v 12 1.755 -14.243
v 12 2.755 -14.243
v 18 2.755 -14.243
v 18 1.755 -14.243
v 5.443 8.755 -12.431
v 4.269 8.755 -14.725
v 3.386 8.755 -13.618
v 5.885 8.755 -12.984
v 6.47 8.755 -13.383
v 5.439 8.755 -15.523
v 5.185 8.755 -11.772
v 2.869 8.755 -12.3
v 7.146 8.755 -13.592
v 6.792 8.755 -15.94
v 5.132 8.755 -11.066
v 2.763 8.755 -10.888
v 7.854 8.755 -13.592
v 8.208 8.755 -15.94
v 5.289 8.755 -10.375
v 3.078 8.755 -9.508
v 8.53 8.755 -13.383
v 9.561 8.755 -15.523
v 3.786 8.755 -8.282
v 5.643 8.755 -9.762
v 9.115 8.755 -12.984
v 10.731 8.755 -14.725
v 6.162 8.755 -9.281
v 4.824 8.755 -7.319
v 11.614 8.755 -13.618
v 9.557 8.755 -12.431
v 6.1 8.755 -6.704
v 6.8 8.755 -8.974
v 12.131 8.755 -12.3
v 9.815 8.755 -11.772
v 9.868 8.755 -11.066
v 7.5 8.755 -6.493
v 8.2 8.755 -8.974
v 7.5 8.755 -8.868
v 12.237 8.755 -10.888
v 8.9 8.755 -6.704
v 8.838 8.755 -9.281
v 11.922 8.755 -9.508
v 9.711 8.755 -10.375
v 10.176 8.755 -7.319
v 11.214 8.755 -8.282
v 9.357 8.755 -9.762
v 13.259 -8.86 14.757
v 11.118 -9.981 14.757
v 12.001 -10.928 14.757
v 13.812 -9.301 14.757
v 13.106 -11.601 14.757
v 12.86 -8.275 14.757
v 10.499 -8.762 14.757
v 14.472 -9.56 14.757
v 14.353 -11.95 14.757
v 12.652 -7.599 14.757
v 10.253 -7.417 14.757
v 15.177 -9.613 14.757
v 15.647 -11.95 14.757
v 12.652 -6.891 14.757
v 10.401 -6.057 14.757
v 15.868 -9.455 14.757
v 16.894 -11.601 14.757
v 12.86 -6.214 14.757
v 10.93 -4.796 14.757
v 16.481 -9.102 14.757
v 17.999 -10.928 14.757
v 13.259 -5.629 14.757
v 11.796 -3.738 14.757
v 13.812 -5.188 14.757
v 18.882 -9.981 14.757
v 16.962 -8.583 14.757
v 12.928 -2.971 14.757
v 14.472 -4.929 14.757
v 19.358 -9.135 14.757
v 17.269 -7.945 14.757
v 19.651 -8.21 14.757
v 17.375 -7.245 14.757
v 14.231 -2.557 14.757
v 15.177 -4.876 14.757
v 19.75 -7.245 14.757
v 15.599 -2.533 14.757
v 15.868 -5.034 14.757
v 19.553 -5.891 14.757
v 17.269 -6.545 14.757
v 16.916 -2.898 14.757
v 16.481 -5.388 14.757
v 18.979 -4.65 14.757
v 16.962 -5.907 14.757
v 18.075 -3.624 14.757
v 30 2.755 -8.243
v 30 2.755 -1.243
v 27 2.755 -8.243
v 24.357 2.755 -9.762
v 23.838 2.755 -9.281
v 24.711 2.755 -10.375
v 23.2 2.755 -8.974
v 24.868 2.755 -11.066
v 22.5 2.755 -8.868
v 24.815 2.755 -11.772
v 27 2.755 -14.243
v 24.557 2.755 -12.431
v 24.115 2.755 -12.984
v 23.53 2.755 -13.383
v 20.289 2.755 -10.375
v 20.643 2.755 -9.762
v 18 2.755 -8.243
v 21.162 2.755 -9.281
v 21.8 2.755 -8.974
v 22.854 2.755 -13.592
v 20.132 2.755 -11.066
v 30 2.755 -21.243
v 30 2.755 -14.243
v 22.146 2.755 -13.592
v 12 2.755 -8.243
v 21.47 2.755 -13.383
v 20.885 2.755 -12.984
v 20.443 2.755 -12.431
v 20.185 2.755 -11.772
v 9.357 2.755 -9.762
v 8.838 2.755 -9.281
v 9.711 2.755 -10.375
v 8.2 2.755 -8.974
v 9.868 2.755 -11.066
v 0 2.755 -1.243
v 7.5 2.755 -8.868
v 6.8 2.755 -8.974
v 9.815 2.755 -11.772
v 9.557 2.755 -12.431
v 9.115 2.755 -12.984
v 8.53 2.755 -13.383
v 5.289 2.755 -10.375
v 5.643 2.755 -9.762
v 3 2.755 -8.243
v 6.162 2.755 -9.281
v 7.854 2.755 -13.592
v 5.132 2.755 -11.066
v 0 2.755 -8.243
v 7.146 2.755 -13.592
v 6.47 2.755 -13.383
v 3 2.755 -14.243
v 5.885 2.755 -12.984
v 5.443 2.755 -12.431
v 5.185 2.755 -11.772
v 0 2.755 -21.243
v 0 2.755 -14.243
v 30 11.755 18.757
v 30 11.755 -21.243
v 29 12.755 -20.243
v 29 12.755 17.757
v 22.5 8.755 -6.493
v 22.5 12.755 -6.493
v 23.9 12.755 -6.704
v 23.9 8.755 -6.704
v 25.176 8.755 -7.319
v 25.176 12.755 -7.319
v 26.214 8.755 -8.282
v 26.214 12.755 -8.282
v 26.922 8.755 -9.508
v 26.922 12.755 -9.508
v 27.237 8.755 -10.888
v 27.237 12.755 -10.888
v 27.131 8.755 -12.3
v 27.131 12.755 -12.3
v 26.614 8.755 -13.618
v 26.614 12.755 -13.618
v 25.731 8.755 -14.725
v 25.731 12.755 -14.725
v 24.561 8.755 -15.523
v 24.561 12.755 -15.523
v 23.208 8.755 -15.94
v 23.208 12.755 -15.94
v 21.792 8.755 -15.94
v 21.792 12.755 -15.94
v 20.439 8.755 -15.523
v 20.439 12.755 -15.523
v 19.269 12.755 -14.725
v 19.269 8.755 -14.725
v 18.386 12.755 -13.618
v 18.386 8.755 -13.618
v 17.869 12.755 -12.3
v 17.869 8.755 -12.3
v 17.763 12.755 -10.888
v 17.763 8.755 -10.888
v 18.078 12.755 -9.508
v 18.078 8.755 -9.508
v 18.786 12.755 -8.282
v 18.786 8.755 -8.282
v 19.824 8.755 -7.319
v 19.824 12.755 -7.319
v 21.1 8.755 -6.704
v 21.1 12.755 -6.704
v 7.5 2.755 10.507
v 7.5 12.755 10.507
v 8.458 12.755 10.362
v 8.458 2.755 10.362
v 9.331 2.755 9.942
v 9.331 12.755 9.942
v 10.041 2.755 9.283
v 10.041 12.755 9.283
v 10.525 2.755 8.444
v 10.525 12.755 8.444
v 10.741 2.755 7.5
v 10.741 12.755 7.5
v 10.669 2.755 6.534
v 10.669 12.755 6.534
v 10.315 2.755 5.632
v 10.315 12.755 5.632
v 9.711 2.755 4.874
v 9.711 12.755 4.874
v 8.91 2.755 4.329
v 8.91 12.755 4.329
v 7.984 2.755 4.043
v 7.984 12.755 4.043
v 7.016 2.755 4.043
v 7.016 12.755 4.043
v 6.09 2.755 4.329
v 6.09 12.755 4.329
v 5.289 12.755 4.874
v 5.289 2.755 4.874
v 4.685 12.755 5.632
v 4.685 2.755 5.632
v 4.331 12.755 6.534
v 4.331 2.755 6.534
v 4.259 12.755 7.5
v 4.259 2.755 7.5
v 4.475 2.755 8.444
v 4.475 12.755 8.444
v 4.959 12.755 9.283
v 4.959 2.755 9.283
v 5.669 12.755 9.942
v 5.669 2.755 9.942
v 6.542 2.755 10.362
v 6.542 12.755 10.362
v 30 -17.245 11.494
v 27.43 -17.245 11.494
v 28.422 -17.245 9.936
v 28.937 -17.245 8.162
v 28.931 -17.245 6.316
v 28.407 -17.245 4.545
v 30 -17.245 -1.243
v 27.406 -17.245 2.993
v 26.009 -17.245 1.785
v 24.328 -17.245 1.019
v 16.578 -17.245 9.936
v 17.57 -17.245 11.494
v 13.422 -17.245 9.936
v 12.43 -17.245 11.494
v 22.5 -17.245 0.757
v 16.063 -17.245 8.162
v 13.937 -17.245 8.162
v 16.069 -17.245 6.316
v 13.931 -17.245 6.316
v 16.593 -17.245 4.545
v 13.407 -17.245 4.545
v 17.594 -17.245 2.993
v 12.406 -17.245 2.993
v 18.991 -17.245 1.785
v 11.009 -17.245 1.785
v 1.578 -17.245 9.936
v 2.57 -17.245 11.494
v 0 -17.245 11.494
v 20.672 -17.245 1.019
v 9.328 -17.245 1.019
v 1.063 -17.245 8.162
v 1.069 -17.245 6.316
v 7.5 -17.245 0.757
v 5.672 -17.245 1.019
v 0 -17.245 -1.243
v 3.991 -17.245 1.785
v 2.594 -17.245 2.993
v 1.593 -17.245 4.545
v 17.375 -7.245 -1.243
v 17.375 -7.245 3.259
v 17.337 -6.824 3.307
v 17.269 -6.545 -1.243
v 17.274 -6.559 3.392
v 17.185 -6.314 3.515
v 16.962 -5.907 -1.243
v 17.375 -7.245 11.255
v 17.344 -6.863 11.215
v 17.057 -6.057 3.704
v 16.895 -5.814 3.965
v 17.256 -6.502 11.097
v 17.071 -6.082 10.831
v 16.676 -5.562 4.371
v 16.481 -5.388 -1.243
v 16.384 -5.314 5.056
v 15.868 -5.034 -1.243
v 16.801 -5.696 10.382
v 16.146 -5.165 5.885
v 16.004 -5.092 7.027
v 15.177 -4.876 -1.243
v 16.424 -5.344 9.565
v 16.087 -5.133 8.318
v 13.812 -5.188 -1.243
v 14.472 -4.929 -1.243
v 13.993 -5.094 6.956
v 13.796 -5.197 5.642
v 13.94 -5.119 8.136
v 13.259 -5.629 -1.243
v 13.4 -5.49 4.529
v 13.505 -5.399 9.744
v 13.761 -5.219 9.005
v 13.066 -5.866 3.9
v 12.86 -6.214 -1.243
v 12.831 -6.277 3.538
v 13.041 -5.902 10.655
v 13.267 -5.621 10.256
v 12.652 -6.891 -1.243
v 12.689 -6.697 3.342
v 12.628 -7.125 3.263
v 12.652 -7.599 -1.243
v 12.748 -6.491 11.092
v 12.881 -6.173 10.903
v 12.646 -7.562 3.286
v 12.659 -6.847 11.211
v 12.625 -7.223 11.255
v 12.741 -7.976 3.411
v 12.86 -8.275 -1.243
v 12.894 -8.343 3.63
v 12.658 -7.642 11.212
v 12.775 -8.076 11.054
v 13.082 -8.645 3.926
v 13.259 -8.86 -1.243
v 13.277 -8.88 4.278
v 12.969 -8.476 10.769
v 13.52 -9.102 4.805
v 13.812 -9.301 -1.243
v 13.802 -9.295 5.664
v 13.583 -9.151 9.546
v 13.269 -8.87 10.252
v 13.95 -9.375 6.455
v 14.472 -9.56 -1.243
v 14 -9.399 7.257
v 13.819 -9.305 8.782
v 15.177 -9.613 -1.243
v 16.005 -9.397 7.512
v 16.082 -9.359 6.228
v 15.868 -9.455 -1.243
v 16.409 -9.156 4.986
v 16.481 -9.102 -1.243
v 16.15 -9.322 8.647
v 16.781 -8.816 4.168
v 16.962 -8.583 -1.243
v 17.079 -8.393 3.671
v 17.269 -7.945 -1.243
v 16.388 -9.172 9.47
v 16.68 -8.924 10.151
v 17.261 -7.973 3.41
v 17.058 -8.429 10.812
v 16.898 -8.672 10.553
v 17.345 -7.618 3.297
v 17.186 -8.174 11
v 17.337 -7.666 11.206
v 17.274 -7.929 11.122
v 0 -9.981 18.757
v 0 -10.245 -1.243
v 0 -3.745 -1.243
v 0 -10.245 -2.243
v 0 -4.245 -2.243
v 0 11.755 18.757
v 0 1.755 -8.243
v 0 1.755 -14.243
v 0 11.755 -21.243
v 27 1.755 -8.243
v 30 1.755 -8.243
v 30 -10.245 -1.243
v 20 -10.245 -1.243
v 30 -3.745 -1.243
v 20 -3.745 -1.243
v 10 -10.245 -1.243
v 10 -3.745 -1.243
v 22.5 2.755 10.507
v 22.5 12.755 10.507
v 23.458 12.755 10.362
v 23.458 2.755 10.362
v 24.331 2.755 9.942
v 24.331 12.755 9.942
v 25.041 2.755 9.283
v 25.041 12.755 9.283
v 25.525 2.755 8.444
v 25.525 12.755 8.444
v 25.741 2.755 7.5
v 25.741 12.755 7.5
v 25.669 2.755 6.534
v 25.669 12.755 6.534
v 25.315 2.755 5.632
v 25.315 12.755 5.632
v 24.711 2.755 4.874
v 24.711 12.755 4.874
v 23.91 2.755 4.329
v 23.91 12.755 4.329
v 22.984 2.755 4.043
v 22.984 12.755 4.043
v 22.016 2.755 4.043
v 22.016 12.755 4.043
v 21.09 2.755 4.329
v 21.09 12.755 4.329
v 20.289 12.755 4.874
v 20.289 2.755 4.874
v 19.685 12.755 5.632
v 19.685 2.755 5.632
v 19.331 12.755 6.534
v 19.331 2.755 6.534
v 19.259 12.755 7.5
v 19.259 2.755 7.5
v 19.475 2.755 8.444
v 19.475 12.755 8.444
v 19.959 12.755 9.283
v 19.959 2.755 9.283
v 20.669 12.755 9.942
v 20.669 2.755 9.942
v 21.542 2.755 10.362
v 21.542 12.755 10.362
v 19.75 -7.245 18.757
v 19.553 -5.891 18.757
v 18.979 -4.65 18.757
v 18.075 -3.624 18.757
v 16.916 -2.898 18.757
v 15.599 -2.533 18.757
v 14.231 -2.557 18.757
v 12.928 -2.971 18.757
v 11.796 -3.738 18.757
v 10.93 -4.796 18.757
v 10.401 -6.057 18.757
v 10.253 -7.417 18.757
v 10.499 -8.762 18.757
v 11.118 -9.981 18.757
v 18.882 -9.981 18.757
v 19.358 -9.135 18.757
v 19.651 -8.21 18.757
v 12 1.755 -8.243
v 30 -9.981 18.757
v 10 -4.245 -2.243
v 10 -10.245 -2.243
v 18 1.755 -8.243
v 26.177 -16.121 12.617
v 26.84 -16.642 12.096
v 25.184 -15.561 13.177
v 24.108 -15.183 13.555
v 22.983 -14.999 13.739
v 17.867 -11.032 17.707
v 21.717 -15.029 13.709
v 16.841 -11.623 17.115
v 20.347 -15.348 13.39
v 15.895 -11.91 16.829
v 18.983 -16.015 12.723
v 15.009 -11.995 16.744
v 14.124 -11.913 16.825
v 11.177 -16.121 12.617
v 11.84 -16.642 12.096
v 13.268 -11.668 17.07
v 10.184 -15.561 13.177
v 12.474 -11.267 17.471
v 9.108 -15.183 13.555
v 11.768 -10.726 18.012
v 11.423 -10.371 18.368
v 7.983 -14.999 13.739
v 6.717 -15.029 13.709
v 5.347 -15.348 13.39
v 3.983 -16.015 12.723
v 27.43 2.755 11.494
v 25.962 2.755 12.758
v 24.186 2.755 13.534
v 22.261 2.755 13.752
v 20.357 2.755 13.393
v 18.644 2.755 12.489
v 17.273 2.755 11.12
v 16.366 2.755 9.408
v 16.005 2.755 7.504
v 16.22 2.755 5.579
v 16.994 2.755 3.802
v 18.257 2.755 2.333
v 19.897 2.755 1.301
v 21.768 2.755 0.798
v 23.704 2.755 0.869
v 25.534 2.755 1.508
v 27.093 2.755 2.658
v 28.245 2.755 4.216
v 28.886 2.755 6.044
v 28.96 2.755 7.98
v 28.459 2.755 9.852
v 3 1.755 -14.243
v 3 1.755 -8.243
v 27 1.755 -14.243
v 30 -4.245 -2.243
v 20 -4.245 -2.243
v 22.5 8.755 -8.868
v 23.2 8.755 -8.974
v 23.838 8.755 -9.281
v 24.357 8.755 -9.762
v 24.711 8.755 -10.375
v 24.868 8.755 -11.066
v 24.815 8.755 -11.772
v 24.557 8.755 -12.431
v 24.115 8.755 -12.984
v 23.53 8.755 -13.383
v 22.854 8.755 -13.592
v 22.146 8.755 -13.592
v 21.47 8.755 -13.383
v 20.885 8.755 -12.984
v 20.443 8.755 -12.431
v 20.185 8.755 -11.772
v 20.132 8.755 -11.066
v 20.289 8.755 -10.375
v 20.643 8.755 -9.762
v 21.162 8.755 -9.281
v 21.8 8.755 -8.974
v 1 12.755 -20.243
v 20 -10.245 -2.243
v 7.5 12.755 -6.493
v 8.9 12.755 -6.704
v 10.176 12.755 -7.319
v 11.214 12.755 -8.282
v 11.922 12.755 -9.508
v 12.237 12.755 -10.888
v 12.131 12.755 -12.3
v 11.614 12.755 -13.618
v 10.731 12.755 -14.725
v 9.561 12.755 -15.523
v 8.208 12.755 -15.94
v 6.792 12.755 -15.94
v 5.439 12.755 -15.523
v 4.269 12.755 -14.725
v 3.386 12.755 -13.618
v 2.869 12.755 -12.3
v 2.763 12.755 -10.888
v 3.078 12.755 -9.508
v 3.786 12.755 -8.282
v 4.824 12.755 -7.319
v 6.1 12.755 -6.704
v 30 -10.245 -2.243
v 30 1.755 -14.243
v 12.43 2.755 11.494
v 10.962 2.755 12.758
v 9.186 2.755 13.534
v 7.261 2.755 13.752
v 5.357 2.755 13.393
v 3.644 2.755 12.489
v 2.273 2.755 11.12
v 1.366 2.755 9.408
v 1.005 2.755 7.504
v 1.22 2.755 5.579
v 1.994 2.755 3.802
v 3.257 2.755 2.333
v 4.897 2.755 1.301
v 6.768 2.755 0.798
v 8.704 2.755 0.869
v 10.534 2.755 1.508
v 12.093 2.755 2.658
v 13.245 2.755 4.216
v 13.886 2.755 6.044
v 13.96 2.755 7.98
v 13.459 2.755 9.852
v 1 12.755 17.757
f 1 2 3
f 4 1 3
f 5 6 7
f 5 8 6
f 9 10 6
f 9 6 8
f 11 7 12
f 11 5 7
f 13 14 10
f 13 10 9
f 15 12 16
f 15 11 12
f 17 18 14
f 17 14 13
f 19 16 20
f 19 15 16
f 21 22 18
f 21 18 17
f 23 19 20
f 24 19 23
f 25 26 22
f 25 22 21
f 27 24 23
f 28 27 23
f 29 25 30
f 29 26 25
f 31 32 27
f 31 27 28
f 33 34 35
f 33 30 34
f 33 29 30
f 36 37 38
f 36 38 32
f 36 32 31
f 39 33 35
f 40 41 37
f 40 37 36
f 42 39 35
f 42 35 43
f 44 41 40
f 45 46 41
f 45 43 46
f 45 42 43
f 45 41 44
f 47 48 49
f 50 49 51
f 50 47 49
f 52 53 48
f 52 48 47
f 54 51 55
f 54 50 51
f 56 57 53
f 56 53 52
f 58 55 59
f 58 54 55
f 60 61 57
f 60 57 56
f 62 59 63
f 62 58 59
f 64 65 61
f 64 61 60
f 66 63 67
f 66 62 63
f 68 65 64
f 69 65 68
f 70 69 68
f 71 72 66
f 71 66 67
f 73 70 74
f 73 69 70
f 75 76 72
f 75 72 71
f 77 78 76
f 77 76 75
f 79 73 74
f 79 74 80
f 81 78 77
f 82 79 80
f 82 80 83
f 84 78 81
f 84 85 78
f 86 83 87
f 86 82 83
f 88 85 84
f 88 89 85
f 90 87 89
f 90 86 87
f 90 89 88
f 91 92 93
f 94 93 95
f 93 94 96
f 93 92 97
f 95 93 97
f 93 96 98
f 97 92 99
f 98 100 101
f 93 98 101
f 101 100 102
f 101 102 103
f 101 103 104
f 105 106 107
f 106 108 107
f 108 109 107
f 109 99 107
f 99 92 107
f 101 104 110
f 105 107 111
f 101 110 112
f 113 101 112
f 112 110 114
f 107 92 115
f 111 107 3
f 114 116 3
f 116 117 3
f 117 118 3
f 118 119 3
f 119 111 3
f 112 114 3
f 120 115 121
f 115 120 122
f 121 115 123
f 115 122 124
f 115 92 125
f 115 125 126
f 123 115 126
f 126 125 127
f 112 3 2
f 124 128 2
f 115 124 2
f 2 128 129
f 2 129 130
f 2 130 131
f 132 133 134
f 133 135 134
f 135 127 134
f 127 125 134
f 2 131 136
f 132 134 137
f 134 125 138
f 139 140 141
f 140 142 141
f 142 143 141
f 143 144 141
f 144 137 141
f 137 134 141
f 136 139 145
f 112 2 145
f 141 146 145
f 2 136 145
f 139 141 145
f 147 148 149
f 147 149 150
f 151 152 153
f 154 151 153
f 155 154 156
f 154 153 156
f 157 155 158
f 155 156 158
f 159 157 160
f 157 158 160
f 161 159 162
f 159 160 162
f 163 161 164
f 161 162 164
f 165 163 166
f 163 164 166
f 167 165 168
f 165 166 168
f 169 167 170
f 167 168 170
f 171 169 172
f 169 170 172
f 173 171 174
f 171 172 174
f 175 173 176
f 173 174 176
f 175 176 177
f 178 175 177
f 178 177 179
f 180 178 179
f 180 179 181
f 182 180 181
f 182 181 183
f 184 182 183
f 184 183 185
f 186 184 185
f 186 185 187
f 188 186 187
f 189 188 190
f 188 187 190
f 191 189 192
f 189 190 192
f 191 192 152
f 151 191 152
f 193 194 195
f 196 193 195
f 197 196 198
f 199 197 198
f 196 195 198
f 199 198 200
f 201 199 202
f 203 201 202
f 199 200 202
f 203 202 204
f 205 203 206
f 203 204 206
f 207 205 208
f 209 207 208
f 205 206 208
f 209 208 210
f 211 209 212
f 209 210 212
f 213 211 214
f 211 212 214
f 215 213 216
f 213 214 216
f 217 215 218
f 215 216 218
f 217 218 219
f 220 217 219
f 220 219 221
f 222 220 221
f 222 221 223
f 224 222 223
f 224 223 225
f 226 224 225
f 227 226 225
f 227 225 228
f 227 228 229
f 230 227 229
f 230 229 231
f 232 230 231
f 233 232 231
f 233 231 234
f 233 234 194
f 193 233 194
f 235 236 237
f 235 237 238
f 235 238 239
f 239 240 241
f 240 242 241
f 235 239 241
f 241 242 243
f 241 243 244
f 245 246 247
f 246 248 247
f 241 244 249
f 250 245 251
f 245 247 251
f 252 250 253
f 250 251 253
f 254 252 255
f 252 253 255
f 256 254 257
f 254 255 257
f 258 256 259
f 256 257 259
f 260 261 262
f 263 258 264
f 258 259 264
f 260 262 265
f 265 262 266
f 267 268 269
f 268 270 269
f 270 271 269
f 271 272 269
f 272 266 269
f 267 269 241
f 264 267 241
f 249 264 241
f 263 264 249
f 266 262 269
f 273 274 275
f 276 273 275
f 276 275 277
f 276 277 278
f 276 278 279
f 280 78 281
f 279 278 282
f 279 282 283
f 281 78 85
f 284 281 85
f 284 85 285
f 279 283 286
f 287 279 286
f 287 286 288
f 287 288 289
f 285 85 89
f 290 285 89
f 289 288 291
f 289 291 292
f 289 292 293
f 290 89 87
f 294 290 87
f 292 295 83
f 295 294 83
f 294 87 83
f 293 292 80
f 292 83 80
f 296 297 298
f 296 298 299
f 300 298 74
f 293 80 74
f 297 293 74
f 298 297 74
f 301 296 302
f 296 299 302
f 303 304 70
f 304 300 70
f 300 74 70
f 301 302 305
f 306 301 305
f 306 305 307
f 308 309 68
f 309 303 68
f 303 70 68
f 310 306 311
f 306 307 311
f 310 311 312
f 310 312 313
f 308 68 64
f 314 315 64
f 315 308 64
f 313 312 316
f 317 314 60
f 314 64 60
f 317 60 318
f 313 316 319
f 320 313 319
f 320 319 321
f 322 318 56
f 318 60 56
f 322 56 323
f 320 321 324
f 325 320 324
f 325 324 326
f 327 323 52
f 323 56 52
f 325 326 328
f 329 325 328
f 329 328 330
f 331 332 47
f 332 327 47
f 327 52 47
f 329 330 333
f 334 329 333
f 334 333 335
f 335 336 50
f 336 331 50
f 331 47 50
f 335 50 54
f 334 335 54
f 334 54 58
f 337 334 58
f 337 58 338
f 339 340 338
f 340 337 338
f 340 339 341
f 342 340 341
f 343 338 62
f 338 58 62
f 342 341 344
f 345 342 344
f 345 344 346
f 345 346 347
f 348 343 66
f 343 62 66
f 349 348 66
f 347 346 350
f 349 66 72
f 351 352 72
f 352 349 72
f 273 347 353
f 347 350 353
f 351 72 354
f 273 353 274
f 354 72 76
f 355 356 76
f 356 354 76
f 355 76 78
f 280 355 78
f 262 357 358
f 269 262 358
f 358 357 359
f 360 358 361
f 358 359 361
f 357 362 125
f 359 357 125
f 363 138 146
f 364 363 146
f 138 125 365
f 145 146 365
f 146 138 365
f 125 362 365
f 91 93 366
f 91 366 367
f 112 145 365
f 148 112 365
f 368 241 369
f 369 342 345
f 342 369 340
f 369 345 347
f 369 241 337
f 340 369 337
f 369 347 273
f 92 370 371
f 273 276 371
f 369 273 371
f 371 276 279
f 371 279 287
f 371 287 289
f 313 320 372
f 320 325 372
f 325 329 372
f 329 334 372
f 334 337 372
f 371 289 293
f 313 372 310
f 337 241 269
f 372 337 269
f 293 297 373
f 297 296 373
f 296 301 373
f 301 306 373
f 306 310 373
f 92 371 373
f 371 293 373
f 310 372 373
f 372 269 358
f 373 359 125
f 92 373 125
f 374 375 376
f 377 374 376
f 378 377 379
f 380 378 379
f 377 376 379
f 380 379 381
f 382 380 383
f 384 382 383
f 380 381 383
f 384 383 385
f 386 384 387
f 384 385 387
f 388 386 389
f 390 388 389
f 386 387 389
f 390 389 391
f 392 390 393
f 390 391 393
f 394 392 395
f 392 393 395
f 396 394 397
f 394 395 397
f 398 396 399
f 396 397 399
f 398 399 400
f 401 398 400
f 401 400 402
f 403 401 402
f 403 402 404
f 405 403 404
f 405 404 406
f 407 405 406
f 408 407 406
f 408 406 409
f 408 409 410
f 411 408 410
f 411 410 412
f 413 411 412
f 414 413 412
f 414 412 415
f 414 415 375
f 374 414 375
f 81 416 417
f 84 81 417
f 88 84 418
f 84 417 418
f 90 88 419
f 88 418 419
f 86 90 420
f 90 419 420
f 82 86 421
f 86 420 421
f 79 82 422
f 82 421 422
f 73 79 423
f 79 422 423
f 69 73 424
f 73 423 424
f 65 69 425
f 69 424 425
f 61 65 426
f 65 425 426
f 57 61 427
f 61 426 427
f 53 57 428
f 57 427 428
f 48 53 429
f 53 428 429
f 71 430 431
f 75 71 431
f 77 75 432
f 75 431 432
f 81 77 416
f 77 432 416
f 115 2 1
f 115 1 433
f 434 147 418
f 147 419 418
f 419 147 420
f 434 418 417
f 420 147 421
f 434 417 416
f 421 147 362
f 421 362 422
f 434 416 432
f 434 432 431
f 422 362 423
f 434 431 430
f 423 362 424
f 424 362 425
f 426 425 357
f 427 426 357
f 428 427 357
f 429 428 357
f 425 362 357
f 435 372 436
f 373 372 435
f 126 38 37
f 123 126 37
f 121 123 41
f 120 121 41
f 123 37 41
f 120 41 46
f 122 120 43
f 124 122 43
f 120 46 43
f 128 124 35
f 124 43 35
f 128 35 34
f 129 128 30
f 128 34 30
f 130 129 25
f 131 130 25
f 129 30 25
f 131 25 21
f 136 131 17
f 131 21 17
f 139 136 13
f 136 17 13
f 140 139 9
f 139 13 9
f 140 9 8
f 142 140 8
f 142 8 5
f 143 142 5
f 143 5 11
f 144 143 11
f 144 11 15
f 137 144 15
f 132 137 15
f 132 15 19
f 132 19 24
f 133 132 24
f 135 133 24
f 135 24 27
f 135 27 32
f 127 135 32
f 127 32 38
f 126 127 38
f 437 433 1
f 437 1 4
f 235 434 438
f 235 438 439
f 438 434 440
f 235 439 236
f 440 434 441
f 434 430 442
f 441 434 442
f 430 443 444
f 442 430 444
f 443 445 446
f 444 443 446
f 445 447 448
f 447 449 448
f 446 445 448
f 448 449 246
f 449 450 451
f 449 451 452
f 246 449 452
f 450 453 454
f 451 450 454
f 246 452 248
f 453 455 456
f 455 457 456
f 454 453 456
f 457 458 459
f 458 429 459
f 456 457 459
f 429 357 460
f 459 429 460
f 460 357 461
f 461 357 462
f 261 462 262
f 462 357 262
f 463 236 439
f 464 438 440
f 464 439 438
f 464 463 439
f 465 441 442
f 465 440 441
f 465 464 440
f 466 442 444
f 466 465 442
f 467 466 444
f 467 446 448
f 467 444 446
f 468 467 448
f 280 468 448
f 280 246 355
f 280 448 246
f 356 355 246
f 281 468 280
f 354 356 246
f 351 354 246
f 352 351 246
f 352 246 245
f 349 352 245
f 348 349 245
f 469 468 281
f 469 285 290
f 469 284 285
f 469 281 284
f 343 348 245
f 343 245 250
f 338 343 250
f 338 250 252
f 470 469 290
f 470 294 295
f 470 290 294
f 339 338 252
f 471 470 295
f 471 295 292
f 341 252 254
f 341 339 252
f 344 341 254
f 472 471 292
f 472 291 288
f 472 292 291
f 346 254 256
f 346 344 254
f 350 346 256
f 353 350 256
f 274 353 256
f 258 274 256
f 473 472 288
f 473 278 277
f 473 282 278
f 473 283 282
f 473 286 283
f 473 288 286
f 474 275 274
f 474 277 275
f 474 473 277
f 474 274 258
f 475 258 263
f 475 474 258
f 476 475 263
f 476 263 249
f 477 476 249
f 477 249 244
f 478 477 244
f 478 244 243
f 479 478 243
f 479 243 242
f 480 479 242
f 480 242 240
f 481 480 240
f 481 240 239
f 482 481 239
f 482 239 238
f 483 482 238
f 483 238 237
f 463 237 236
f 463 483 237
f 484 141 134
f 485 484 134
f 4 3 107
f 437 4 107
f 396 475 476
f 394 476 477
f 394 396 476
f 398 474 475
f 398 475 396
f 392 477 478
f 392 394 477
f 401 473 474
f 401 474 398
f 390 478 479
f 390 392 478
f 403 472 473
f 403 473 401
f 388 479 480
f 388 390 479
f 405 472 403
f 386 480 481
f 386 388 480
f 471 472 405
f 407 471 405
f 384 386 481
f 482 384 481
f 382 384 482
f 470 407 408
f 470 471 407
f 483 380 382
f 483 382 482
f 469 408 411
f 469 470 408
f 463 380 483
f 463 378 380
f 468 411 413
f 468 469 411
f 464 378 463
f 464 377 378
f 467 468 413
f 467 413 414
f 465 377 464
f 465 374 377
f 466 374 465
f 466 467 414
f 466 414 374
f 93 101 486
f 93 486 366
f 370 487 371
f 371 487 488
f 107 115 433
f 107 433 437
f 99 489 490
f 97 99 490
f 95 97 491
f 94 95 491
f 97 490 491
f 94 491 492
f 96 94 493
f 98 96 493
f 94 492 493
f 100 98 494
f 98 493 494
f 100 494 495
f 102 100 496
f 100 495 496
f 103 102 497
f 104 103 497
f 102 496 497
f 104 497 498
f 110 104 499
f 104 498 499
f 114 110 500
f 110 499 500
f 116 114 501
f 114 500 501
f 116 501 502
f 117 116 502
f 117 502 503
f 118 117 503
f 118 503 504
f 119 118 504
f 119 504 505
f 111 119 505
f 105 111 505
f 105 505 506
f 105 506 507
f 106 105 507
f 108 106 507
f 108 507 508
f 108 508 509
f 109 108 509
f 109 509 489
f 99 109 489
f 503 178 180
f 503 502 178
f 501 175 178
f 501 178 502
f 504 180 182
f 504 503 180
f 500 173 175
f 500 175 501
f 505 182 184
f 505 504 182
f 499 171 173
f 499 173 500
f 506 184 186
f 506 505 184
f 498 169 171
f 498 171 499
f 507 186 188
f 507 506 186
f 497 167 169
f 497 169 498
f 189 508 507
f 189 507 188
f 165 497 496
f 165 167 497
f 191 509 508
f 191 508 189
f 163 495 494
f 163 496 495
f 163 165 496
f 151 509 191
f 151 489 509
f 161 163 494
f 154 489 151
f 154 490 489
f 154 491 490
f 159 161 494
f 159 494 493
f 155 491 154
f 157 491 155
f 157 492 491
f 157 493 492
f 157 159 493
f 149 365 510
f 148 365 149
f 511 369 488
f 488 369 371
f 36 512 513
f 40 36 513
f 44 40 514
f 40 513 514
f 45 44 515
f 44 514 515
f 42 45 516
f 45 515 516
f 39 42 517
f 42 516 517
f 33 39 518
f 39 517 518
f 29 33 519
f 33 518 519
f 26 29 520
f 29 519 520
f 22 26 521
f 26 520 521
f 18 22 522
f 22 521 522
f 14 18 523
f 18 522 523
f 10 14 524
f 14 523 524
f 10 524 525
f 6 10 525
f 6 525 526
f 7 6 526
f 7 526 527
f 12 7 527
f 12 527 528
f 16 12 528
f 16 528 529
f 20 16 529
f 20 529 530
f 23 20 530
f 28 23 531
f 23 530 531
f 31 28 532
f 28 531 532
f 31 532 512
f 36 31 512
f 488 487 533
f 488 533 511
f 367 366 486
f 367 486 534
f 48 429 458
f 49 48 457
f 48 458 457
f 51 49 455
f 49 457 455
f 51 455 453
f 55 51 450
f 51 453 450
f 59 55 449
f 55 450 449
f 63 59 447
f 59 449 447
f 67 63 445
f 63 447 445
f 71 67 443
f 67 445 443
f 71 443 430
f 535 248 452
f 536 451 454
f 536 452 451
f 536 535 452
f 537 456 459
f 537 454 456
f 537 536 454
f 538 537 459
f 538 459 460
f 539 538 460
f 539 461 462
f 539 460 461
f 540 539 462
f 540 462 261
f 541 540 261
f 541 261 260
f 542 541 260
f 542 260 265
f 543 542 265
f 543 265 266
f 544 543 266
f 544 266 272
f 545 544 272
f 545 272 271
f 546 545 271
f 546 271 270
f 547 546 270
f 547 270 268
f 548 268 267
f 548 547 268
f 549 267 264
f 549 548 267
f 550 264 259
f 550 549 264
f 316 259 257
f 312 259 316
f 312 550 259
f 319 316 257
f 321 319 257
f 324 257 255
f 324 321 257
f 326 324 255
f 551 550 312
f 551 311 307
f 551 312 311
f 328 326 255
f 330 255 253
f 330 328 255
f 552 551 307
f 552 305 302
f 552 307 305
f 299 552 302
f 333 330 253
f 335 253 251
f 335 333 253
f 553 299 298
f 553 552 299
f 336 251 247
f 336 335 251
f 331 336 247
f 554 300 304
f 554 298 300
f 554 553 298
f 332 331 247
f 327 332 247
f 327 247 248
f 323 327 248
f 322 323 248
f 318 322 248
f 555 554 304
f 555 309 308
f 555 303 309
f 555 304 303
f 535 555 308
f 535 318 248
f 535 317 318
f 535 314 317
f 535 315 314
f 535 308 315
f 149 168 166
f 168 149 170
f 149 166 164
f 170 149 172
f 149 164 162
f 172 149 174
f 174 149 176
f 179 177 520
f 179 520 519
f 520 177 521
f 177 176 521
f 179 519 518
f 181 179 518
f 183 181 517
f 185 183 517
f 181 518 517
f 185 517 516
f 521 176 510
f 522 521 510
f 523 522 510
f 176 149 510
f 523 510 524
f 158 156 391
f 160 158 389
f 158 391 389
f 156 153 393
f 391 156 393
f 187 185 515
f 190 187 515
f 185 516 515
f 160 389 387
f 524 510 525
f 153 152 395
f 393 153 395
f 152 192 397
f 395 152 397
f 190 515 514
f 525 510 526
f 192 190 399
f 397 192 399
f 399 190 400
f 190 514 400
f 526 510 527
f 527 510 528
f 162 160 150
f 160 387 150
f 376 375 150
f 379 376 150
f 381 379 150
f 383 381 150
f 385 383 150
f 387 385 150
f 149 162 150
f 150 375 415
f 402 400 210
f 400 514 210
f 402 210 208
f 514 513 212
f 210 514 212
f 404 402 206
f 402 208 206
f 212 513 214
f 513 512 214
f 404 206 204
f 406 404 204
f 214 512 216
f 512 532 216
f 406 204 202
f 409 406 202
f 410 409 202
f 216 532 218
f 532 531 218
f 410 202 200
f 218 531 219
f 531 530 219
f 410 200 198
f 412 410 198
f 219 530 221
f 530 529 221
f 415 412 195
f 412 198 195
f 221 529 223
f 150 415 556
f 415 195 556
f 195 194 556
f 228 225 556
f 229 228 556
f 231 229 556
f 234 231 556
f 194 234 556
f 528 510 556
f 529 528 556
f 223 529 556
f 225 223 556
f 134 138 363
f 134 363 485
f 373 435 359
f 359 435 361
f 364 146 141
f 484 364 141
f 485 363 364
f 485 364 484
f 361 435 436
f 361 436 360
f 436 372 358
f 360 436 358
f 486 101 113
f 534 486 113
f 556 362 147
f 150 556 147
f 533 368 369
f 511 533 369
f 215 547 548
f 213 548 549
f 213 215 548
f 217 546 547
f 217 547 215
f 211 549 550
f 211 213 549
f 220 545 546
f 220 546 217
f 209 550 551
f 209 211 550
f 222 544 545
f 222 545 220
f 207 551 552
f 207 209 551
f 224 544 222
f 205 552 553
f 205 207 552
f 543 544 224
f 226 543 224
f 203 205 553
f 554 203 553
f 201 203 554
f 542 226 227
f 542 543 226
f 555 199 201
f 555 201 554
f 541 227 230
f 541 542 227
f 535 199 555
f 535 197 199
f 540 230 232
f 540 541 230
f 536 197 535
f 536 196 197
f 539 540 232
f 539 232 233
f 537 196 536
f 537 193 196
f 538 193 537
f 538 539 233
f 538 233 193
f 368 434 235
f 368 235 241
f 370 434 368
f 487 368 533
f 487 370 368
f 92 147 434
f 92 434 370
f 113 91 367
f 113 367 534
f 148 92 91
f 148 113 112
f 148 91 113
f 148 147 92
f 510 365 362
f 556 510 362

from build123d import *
from OCP.BRepFilletAPI import BRepFilletAPI_MakeChamfer

# Parameters (mm, degrees)
RESSALTO_EXTRUS_O1_DEPTH = 30
CORTE_EXTRUS_O1_REACH    = 49.448
ESBO_O2_R                = 2.375
ESBO_O2_R_2              = 3.25
ESBO_O2_3_R              = 4.75
ESBO_O2_3_R_2            = 2.375
CORTE_EXTRUS_O3_DEPTH    = 4
CORTE_EXTRUS_O2_REACH    = 54.89
ESBO_O3_R                = 2.375
ESBO_O3_3_R              = 2.375
CORTE_EXTRUS_O4_DEPTH    = 4
ESBO_O4_W                = 6
ESBO_O4_H                = 6
ESBO_O4_W_2              = 3
RESSALTO_EXTRUS_O2_DEPTH = 1
ESBO_O5_R                = 6.5
CORTE_EXTRUS_O5_DEPTH    = 42.848200707
CHANFRO1_SIZE            = 1
ESBO_O6_W                = 10
ESBO_O6_H                = 6
RESSALTO_EXTRUS_O3_DEPTH = 1
CHANFRO2_SIZE            = 0.5
CHANFRO2_SIZE_2          = 1


with BuildPart() as part:
    # Esboço1 → Ressalto-extrusão1 (new body)
    with BuildSketch(Plane(origin=(0, 0, 0), x_dir=(0, 0, -1), z_dir=(1, 0, 0))):
        Polygon((21.243161309, 12.755336939), (-18.756838691, 12.755336939), (-18.756838691, -9.981327227), (-11.493502857, -17.244663061), (1.243161309, -17.244663061), (1.243161309, 2.755336939), (21.243161309, 2.755336939), align=None)
    extrude(amount=RESSALTO_EXTRUS_O1_DEPTH)

    # Esboço2 → Corte-extrusão1 (cut, up to next)
    with BuildSketch(Plane(origin=(0, 12.755336939, 0), x_dir=(1, 0, 0), z_dir=(0, 1, 0)), mode=Mode.PRIVATE) as corte_extrus_o1_sk1:
        with Locations(Location((7.5, 11.243161309, 0), (0, 0, 270))):
            Circle(ESBO_O2_R)
    corte_extrus_o1_tool1 = extrude(corte_extrus_o1_sk1.sketch, amount=-CORTE_EXTRUS_O1_REACH, mode=Mode.PRIVATE) & part.part
    # Esboço2 → Corte-extrusão1 (cut, up to next)
    with BuildSketch(Plane(origin=(0, 12.755336939, 0), x_dir=(1, 0, 0), z_dir=(0, 1, 0)), mode=Mode.PRIVATE) as corte_extrus_o1_sk2:
        with Locations(Location((22.5, 11.243161309, 0), (0, 0, 270))):
            Circle(ESBO_O2_R)
    corte_extrus_o1_tool2 = extrude(corte_extrus_o1_sk2.sketch, amount=-CORTE_EXTRUS_O1_REACH, mode=Mode.PRIVATE) & part.part
    # Esboço2 → Corte-extrusão1 (cut, up to next)
    with BuildSketch(Plane(origin=(0, 12.755336939, 0), x_dir=(1, 0, 0), z_dir=(0, 1, 0)), mode=Mode.PRIVATE) as corte_extrus_o1_sk3:
        with Locations(Location((22.5, -7.256838691, 0), (0, 0, 270))):
            Circle(ESBO_O2_R_2)
    corte_extrus_o1_tool3 = extrude(corte_extrus_o1_sk3.sketch, amount=-CORTE_EXTRUS_O1_REACH, mode=Mode.PRIVATE) & part.part
    # Esboço2 → Corte-extrusão1 (cut, up to next)
    with BuildSketch(Plane(origin=(0, 12.755336939, 0), x_dir=(1, 0, 0), z_dir=(0, 1, 0)), mode=Mode.PRIVATE) as corte_extrus_o1_sk4:
        with Locations(Location((7.5, -7.256838691, 0), (0, 0, 270))):
            Circle(ESBO_O2_R_2)
    corte_extrus_o1_tool4 = extrude(corte_extrus_o1_sk4.sketch, amount=-CORTE_EXTRUS_O1_REACH, mode=Mode.PRIVATE) & part.part
    add(corte_extrus_o1_tool1.solids().sort_by_distance((7.5, 12.755337, -11.243161))[0], mode=Mode.SUBTRACT)
    add(corte_extrus_o1_tool2.solids().sort_by_distance((22.5, 12.755337, -11.243161))[0], mode=Mode.SUBTRACT)
    add(corte_extrus_o1_tool3.solids().sort_by_distance((22.5, 12.755337, 7.256839))[0], mode=Mode.SUBTRACT)
    add(corte_extrus_o1_tool4.solids().sort_by_distance((7.5, 12.755337, 7.256839))[0], mode=Mode.SUBTRACT)

    # Esboço2<3> → Corte-extrusão3 (cut)
    # profile 1 of 2: a face of its own
    with BuildSketch(Plane(origin=(0, 12.755336939, 0), x_dir=(1, 0, 0), z_dir=(0, 1, 0))):
        with Locations(Location((7.5, 11.243161309, 0), (0, 0, 270))):
            Circle(ESBO_O2_3_R)
        with Locations(Location((7.5, 11.243161309, 0), (0, 0, 270))):
            Circle(ESBO_O2_3_R_2, mode=Mode.SUBTRACT)
    # profile 2 of 2: a face of its own
    with BuildSketch(Plane(origin=(0, 12.755336939, 0), x_dir=(1, 0, 0), z_dir=(0, 1, 0))):
        with Locations(Location((22.5, 11.243161309, 0), (0, 0, 270))):
            Circle(ESBO_O2_3_R)
        with Locations(Location((22.5, 11.243161309, 0), (0, 0, 270))):
            Circle(ESBO_O2_3_R_2, mode=Mode.SUBTRACT)
    extrude(amount=-CORTE_EXTRUS_O3_DEPTH, mode=Mode.SUBTRACT)

    # Esboço3 → Corte-extrusão2 (cut, up to next)
    with BuildSketch(Plane.XY.offset(18.756838691), mode=Mode.PRIVATE) as corte_extrus_o2_sk1:
        with Locations((15, -7.244663061)):
            Circle(ESBO_O3_R)
    corte_extrus_o2_tool1 = extrude(corte_extrus_o2_sk1.sketch, amount=-CORTE_EXTRUS_O2_REACH, mode=Mode.PRIVATE) & part.part
    add(corte_extrus_o2_tool1.solids().sort_by_distance((15, -7.244663, 18.756839))[0], mode=Mode.SUBTRACT)

    # Esboço3<3> → Corte-extrusão4 (cut)
    # profile 1 of 2: a face of its own
    with BuildSketch(Plane.XY.offset(18.756838691)):
        with BuildLine():
            Line((18.882417963, -9.981327227), (11.117582037, -9.981327227))
            ThreePointArc((11.117582037, -9.981327227), (15, -11.994663061), (18.882417963, -9.981327227))
        make_face()
    # profile 2 of 2: a face of its own
    with BuildSketch(Plane.XY.offset(18.756838691)):
        with BuildLine():
            ThreePointArc((18.882417963, -9.981327227), (19.527912617, -8.680109799), (19.75, -7.244663061))
            ThreePointArc((19.75, -7.244663061), (13.564553262, -2.716750444), (11.117582037, -9.981327227))
            Line((11.117582037, -9.981327227), (18.882417963, -9.981327227))
        make_face()
        with Locations((15, -7.244663061)):
            Circle(ESBO_O3_3_R, mode=Mode.SUBTRACT)
    extrude(amount=-CORTE_EXTRUS_O4_DEPTH, mode=Mode.SUBTRACT)

    # Esboço4 → Ressalto-extrusão2 (add)
    with BuildSketch(Plane.XZ.offset(-2.755336939)):
        with Locations((15, -11.243161309)):
            Rectangle(ESBO_O4_W, ESBO_O4_H)
        with Locations((1.5, -11.243161309)):
            Rectangle(ESBO_O4_W_2, ESBO_O4_H)
        with Locations((28.5, -11.243161309)):
            Rectangle(ESBO_O4_W_2, ESBO_O4_H)
    extrude(amount=RESSALTO_EXTRUS_O2_DEPTH)

    # Esboço5 → Corte-extrusão5 (cut, through all)
    with BuildSketch(Plane.XZ.offset(-2.755336939)):
        with Locations(Location((7.5, 7.256838691, 0), (0, 0, 40.677035539))):
            Circle(ESBO_O5_R)
        with Locations(Location((22.5, 7.256838691, 0), (0, 0, 40.677035539))):
            Circle(ESBO_O5_R)
    extrude(amount=CORTE_EXTRUS_O5_DEPTH, mode=Mode.SUBTRACT)

    # Chanfro1
    chanfro1_edges = [part.edges().sort_by_distance(p)[0] for p in [
        (0, 12.755336939, -1.243161309),
        (30, 12.755336939, -1.243161309),
        (15, 12.755336939, 18.756838691),
        (15, 12.755336939, -21.243161309),
    ]]
    chamfer(chanfro1_edges, length=CHANFRO1_SIZE)

    # Esboço6 → Ressalto-extrusão3 (add)
    with BuildSketch(Plane(origin=(0, 0, -1.243161309), x_dir=(-1, 0, 0), z_dir=(0, 0, -1))):
        with Locations((-25, -7.244663061)):
            Rectangle(ESBO_O6_W, ESBO_O6_H)
        with Locations((-5, -7.244663061)):
            Rectangle(ESBO_O6_W, ESBO_O6_H)
    extrude(amount=RESSALTO_EXTRUS_O3_DEPTH)

    # Chanfro2
    chanfro2_edges_1 = [part.edges().sort_by_distance(p)[0] for p in [
        (25, -4.244663061, -1.243161309),
    ]]
    chanfro2_side_1 = [part.faces().sort_by_distance(p)[0] for p in [
        (25, -4.234663061, -1.243161309),
    ]]
    chanfro2_edges_2 = [part.edges().sort_by_distance(p)[0] for p in [
        (5, -4.244663061, -1.243161309),
    ]]
    chanfro2_side_2 = [part.faces().sort_by_distance(p)[0] for p in [
        (5, -4.234663061, -1.243161309),
    ]]
    chanfro2 = BRepFilletAPI_MakeChamfer(part.part.solid().wrapped)
    for e in chanfro2_edges_1:
        chanfro2.Add(CHANFRO2_SIZE - 0.0001, CHANFRO2_SIZE_2 - 0.0001, e.wrapped, chanfro2_side_1[0].wrapped)
    for e in chanfro2_edges_2:
        chanfro2.Add(CHANFRO2_SIZE - 0.0001, CHANFRO2_SIZE_2 - 0.0001, e.wrapped, chanfro2_side_2[0].wrapped)
    add(Compound.cast(chanfro2.Shape()), mode=Mode.REPLACE)  # a hair under: the kernel refuses the full size


solid = part.part
